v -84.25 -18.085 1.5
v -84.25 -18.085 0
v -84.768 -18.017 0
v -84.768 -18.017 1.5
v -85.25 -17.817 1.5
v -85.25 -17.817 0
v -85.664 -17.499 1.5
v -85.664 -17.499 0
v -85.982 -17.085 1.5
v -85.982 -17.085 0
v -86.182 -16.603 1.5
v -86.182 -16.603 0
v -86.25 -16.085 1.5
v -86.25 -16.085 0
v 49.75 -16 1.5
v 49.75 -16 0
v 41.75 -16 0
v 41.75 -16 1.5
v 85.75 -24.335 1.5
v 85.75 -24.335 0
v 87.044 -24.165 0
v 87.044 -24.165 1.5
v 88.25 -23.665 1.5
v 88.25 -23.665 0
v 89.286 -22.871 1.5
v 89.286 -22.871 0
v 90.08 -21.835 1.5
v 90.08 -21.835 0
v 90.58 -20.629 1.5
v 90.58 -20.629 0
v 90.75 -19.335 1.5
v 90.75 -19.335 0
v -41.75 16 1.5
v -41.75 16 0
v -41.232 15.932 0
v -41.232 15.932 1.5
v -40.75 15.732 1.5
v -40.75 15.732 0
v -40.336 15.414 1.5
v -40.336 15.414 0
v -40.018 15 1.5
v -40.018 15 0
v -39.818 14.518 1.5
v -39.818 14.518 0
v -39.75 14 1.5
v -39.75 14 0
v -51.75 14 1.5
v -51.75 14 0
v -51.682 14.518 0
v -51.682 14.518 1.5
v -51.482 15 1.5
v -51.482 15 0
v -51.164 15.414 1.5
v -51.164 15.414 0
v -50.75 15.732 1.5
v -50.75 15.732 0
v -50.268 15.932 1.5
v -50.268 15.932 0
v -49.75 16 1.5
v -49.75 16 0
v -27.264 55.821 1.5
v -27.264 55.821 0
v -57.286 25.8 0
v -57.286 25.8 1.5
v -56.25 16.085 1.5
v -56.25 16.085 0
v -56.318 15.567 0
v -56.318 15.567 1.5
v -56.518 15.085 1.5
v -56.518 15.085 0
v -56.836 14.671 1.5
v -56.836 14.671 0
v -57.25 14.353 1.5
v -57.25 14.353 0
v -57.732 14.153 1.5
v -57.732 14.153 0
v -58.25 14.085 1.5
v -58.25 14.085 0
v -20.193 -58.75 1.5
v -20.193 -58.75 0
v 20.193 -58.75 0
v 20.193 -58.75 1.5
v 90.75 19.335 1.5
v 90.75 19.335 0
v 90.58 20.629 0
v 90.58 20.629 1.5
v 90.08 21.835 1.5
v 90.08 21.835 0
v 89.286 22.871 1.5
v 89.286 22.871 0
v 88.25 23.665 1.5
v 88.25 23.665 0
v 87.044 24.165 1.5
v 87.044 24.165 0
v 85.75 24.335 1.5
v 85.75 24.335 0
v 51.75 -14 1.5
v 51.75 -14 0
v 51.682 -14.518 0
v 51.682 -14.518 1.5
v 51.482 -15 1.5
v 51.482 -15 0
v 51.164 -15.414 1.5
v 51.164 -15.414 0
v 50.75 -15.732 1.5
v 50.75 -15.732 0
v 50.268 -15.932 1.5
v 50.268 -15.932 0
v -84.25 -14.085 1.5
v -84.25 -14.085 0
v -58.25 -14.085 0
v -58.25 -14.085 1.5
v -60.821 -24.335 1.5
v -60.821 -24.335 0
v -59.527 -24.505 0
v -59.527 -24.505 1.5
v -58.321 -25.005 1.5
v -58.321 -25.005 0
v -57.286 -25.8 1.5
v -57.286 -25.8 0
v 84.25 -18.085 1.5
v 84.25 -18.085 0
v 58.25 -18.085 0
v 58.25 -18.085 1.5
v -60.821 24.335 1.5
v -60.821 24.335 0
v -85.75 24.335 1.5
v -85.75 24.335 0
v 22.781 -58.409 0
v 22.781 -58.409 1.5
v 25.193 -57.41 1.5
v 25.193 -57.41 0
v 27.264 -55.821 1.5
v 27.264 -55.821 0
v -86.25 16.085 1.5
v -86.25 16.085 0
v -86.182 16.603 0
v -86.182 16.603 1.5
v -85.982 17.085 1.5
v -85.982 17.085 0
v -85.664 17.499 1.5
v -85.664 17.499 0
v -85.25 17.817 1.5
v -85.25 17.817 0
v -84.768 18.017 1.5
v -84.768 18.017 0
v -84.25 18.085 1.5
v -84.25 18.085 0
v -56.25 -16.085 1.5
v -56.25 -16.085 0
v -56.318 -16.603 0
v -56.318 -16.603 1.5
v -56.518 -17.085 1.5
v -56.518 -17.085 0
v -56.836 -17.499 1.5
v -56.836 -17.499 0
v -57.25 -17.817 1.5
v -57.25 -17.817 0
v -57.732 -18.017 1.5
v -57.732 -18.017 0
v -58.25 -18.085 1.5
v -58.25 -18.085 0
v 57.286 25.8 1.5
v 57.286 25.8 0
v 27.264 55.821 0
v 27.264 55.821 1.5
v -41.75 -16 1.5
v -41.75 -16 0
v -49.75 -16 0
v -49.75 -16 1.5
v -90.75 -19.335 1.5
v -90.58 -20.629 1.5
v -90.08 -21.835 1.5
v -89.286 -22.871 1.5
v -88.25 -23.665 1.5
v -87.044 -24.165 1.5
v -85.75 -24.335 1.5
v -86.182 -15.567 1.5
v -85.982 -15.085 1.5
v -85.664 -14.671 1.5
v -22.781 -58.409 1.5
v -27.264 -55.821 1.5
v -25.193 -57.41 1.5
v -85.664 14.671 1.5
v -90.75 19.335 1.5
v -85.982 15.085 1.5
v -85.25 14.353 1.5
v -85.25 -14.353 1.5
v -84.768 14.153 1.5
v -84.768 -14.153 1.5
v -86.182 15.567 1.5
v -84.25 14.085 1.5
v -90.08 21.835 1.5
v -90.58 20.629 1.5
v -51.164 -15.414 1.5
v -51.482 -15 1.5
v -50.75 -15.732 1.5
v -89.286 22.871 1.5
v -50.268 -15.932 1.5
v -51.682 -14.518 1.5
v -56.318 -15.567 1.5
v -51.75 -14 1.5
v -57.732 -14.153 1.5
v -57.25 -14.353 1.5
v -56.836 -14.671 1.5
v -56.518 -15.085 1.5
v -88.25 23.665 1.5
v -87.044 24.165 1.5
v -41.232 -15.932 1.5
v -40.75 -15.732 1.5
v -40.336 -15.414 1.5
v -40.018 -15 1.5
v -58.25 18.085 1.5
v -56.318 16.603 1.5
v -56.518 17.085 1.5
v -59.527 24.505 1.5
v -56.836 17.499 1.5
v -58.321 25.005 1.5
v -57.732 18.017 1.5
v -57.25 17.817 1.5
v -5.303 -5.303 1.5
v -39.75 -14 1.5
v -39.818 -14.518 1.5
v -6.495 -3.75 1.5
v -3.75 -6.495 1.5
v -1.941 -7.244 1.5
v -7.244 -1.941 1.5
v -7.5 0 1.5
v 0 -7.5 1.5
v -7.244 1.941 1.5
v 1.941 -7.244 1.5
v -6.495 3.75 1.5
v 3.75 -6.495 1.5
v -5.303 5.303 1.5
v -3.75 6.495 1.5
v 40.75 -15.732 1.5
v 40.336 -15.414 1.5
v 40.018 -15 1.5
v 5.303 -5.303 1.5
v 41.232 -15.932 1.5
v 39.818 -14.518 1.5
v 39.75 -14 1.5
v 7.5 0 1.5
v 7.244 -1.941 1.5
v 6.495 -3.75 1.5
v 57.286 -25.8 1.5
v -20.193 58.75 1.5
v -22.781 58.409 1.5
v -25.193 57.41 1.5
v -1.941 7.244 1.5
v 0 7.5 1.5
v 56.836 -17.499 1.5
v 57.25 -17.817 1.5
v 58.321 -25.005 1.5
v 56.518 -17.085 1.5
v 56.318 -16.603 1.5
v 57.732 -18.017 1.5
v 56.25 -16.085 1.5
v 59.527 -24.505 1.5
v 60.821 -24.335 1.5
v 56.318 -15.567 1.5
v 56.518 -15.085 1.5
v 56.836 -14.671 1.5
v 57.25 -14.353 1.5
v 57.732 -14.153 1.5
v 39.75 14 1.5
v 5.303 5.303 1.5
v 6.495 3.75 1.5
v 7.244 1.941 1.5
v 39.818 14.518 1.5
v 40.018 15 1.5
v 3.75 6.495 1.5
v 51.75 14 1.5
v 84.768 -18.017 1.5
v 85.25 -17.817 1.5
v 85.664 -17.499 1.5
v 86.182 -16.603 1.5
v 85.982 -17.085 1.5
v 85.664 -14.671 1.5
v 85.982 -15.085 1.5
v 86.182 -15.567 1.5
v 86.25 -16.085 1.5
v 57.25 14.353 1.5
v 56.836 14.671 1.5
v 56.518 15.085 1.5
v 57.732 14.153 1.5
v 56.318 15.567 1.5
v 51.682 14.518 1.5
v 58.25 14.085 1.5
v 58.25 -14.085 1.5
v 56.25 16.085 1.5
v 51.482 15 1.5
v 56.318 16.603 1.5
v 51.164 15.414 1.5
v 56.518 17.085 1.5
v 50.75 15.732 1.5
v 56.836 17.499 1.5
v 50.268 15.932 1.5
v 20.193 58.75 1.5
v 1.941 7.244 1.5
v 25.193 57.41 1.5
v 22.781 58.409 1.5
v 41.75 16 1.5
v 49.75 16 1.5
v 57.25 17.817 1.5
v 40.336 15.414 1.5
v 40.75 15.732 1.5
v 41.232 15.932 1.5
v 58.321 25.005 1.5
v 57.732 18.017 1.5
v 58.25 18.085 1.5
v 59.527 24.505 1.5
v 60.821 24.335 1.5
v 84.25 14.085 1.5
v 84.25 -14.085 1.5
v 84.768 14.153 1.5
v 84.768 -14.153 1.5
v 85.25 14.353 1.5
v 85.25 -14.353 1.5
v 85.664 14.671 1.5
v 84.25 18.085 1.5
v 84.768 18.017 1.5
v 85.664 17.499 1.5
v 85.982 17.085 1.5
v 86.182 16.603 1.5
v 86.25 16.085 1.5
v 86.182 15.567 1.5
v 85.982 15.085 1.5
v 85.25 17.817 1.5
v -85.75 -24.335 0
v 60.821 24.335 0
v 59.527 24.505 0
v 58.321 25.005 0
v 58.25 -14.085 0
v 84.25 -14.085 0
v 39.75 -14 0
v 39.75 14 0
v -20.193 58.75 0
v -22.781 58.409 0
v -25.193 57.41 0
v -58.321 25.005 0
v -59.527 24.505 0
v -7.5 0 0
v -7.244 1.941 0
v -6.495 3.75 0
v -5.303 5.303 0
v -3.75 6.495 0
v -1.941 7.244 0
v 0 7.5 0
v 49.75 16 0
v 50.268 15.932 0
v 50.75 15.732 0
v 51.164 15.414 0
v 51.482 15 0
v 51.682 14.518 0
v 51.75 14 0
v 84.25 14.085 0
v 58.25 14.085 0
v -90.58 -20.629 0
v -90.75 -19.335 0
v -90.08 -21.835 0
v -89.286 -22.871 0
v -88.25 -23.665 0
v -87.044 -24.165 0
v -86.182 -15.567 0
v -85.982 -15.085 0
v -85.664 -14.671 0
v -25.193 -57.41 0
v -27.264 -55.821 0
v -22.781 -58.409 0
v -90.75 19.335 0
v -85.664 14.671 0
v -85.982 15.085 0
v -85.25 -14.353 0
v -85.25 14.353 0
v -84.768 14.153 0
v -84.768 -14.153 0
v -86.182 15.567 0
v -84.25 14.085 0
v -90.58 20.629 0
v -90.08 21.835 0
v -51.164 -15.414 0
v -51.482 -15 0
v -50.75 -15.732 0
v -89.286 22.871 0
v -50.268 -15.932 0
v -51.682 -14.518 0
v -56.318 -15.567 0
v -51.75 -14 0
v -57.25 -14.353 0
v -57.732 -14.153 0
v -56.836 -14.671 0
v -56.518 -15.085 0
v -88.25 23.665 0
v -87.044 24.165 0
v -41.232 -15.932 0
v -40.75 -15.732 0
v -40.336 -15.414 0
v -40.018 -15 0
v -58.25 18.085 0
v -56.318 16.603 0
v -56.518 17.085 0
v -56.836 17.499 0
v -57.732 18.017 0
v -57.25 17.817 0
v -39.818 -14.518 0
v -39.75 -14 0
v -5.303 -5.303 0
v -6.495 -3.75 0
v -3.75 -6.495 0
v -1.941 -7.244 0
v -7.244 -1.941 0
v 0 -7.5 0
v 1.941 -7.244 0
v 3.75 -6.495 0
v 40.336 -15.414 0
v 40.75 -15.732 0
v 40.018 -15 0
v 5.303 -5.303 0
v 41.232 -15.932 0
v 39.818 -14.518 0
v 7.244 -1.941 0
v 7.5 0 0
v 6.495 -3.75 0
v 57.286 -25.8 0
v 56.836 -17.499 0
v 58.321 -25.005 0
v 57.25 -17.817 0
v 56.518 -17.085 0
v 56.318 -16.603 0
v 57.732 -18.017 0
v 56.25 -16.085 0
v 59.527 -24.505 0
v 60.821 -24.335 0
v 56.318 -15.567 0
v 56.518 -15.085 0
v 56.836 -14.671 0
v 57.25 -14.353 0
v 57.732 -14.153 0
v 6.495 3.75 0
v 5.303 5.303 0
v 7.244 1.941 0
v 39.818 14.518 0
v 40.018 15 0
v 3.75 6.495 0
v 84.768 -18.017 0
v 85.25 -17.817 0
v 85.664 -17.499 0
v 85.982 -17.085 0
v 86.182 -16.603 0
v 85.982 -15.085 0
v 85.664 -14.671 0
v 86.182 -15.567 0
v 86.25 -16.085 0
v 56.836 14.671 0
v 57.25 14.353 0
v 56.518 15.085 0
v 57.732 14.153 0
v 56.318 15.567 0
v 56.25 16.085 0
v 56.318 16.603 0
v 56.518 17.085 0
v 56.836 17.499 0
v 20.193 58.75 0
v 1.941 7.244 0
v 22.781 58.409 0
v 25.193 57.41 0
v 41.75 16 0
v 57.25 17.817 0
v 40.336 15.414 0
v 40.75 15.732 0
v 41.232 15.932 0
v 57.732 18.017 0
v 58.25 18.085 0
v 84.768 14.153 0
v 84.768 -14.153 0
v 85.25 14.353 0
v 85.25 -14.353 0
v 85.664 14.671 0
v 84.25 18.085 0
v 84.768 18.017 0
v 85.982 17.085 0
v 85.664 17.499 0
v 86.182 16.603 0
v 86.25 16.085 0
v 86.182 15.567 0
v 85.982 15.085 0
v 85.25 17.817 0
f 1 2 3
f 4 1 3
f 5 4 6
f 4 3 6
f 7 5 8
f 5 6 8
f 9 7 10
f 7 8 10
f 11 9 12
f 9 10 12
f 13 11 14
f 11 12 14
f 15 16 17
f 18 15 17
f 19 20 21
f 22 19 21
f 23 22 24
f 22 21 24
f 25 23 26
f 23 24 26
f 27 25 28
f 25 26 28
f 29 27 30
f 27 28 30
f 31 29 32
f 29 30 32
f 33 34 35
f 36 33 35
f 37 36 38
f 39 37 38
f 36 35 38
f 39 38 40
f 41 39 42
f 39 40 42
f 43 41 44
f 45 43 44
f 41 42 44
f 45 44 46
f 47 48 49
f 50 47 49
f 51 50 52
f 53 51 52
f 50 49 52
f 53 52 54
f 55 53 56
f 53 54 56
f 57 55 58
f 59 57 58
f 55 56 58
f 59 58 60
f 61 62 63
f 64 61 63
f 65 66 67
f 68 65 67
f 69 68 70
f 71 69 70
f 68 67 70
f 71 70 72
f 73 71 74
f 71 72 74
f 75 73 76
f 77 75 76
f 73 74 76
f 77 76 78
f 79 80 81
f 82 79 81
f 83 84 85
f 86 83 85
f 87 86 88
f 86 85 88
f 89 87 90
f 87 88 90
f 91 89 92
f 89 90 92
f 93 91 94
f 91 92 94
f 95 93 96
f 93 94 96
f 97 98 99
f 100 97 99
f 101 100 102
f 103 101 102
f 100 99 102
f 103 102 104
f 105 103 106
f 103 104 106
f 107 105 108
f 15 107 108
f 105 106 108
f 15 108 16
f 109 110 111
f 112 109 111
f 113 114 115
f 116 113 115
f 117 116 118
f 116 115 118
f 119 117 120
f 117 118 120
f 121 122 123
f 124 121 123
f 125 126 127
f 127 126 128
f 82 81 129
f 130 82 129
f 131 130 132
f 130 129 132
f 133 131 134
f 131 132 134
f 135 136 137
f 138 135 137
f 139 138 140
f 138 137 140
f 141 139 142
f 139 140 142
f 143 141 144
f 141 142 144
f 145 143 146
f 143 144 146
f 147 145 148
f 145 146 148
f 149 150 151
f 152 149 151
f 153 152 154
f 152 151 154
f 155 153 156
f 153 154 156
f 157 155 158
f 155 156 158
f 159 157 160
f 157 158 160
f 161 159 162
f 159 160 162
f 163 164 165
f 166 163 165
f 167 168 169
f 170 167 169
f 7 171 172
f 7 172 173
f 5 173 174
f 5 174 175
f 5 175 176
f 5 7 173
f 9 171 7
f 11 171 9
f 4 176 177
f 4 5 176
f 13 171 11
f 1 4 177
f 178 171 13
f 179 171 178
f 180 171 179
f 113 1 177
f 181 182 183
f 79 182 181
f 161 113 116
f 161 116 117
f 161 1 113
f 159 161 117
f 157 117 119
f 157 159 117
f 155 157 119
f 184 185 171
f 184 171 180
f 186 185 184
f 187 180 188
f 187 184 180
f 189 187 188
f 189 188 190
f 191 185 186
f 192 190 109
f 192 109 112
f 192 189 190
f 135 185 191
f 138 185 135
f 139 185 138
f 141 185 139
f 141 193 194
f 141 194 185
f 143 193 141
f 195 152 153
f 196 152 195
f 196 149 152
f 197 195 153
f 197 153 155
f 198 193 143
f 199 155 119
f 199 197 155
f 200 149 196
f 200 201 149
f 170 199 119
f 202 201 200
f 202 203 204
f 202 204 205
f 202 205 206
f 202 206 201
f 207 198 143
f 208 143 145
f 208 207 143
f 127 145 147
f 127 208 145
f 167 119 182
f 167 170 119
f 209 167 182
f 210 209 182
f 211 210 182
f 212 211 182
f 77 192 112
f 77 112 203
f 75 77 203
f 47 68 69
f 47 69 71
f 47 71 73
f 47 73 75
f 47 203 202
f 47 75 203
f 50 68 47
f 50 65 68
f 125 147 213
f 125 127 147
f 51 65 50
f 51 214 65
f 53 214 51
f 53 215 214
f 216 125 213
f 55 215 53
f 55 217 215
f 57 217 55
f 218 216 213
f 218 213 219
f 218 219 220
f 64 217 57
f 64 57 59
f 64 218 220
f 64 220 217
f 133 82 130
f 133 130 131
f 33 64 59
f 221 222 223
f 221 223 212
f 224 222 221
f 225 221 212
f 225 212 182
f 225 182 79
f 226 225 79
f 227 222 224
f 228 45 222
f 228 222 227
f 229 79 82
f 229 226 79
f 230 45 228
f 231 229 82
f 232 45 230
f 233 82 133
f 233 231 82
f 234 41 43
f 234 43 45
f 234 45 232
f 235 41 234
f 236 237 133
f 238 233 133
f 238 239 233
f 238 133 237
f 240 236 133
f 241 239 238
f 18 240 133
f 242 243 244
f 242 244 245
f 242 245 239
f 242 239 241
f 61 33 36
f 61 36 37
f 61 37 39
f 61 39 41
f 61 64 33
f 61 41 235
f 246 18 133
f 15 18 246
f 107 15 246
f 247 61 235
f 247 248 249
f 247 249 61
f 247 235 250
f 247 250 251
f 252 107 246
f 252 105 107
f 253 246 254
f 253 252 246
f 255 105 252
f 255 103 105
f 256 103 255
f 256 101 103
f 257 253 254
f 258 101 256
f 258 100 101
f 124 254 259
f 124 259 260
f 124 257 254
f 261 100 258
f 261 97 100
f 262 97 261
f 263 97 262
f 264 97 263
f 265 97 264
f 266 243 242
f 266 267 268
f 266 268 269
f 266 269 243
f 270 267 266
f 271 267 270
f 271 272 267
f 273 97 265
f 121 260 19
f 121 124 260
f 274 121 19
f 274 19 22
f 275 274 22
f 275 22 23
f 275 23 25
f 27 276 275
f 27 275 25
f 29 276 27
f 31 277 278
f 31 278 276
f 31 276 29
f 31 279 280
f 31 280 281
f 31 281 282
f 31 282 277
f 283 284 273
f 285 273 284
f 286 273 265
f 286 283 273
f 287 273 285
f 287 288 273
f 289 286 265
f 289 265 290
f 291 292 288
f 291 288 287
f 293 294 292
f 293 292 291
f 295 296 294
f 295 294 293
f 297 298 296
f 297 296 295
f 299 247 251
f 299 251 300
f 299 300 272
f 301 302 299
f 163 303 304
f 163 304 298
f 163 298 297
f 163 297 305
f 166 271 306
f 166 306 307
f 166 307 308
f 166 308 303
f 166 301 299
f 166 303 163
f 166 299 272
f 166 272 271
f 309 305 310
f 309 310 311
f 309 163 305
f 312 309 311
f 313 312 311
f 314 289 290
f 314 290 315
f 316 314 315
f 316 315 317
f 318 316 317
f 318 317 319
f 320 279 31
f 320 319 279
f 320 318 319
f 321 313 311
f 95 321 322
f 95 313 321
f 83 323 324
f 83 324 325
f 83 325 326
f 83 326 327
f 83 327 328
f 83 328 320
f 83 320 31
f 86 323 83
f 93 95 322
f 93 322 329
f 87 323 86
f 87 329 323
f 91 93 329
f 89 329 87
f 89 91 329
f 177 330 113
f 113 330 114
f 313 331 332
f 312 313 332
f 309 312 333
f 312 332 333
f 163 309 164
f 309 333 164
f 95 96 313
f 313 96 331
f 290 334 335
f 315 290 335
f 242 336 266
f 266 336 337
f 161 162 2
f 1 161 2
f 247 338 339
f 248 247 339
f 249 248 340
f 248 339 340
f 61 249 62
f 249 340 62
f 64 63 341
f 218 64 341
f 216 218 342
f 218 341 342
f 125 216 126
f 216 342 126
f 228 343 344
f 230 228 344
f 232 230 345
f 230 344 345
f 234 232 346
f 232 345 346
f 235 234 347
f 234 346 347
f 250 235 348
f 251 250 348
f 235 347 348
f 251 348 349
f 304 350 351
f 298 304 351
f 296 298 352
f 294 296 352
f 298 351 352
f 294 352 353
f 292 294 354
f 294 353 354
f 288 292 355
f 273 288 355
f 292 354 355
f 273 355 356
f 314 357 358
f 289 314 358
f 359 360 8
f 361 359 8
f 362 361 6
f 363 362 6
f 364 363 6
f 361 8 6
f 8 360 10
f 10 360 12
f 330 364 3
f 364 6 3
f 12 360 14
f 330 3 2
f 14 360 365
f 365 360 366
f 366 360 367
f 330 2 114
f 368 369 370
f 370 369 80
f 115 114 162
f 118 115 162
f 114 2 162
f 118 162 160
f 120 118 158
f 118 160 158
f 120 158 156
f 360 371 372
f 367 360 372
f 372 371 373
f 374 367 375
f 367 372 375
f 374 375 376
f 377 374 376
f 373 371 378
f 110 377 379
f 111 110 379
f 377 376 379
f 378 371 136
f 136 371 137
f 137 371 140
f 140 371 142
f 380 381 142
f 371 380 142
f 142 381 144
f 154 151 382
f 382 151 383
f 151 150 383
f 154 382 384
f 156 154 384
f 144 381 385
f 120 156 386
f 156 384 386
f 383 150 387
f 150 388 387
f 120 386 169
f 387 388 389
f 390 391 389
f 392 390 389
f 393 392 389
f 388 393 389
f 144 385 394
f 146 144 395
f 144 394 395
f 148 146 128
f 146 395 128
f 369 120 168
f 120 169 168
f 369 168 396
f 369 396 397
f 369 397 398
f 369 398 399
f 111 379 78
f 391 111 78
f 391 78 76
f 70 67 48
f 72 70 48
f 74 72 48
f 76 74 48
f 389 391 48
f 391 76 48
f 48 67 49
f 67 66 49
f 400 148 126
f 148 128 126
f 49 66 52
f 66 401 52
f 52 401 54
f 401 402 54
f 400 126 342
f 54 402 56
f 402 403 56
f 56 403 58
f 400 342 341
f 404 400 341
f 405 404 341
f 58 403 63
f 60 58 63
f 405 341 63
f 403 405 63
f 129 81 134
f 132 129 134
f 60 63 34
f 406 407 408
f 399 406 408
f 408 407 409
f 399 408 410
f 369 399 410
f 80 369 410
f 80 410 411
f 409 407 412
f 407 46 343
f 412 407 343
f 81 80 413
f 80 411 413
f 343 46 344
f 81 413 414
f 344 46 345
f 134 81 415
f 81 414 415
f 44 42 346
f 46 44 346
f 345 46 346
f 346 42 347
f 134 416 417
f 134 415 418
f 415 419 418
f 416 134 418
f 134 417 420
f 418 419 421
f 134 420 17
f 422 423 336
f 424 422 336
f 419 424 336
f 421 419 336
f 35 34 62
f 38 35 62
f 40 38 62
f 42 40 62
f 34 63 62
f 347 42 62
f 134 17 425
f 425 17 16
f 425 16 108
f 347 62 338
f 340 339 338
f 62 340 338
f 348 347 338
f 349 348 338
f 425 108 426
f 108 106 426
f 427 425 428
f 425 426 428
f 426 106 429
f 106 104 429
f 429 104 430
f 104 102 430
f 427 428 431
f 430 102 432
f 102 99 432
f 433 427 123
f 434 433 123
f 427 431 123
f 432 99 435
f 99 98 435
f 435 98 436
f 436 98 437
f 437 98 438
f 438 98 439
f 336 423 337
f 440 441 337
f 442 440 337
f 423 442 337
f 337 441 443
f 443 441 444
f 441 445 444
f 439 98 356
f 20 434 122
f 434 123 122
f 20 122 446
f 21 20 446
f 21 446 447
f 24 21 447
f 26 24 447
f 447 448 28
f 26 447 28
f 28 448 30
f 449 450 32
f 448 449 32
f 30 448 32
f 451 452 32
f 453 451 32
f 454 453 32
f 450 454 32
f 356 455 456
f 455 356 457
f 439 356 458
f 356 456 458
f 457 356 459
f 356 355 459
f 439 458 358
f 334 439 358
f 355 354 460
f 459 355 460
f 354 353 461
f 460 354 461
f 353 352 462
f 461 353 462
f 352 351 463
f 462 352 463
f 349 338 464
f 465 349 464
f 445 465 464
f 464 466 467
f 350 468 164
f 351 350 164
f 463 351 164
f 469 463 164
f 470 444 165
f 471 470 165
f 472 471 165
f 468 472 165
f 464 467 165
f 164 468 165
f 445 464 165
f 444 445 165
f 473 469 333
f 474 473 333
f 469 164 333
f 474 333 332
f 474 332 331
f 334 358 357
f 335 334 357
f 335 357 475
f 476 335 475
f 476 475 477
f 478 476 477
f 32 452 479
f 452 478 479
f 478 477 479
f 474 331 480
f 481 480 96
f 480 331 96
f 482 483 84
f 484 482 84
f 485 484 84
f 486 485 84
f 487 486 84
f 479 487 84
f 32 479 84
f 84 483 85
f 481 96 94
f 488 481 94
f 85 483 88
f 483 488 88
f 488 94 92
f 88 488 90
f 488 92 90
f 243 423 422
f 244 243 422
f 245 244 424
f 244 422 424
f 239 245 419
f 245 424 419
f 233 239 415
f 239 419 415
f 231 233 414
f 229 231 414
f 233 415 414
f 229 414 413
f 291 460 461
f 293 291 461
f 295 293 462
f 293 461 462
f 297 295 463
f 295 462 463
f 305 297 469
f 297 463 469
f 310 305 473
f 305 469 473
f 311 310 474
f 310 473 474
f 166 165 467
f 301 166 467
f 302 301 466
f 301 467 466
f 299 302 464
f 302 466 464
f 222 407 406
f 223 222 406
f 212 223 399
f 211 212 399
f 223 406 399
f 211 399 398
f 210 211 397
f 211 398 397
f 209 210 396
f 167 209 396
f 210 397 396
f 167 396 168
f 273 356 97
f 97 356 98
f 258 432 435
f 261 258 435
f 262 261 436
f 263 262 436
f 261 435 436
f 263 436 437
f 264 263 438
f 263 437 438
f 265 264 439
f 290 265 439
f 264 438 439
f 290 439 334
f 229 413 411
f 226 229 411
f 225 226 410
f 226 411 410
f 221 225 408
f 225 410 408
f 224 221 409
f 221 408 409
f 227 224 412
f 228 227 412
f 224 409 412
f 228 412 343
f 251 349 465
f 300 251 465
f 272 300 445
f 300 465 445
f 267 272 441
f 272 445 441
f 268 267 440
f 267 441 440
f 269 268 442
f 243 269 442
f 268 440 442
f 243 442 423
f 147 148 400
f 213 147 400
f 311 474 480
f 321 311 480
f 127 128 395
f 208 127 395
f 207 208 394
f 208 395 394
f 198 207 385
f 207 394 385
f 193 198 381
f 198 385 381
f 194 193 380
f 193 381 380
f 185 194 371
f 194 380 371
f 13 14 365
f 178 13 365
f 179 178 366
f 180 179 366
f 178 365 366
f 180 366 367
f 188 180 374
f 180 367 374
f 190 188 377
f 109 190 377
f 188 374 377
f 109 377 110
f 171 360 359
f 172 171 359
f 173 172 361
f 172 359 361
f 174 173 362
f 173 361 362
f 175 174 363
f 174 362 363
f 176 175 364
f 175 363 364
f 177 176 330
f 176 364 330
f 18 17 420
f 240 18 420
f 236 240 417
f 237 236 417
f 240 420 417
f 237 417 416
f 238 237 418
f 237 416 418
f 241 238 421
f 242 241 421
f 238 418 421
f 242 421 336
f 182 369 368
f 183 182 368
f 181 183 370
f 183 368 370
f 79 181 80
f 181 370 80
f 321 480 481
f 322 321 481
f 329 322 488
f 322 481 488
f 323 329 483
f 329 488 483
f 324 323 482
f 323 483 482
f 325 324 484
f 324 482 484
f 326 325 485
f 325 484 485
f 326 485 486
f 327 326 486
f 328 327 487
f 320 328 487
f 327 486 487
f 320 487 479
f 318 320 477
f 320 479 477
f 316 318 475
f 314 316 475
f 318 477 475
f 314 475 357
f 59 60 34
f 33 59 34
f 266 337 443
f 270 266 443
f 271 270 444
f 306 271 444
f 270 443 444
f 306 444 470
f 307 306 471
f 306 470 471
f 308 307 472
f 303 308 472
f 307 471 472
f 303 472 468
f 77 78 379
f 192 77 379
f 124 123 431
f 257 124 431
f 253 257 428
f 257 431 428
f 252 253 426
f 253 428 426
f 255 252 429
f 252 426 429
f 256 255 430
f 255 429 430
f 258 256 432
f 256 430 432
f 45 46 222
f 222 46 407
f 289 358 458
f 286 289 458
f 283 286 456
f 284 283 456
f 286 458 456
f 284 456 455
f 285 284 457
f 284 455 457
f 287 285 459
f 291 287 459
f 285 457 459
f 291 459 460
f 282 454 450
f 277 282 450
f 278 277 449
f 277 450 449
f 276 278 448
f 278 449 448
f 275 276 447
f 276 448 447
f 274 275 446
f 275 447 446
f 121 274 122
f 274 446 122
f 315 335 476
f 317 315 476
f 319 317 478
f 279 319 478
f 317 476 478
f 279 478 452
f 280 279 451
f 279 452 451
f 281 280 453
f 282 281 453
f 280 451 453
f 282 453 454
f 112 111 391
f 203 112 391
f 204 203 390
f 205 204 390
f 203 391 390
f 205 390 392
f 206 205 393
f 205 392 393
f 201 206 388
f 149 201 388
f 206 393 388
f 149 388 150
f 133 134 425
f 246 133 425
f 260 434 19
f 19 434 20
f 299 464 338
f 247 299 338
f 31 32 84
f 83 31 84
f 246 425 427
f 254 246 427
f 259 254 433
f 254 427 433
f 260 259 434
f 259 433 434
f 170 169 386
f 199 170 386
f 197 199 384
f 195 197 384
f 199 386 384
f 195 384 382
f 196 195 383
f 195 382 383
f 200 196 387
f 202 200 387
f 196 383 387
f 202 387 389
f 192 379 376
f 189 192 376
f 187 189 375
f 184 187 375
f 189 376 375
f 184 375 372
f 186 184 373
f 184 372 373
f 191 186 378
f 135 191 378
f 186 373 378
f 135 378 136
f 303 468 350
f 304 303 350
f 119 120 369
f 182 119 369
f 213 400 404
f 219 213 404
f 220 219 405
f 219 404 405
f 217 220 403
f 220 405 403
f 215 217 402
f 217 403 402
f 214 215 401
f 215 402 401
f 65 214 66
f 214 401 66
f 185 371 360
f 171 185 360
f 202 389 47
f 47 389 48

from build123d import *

# Parameters (mm, degrees)
F1_DEPTH = 1.5


with BuildPart() as f1:
    # F0 (on Top) → F1 (new body)
    with BuildSketch(Plane.XY):
        with BuildLine():
            Line((-58.75, -14.085047), (-58.75, 0))
            Line((-58.75, 0), (-90.75, 0))
            Line((-90.75, 0), (-90.75, -14.085047))
            Line((-90.75, -14.085047), (-90.75, -19.335047))
            ThreePointArc((-90.75, -19.335047), (-89.285534, -22.870581), (-85.75, -24.335047))
            Line((-85.75, -24.335047), (-80.50245, -24.335047))
            Line((-80.50245, -24.335047), (-80.50245, -18.085047))
            Line((-80.50245, -18.085047), (-84.25, -18.085047))
            ThreePointArc((-84.25, -18.085047), (-85.664214, -17.49926), (-86.25, -16.085047))
            ThreePointArc((-86.25, -16.085047), (-85.664214, -14.670833), (-84.25, -14.085047))
            Line((-84.25, -14.085047), (-58.75, -14.085047))
        make_face()
        with BuildLine():
            Line((90.75, 0), (58.75, 0))
            Line((58.75, 0), (51.75, 0))
            Line((51.75, 0), (51.75, -14))
            ThreePointArc((51.75, -14), (51.164214, -15.414214), (49.75, -16))
            Line((49.75, -16), (41.75, -16))
            ThreePointArc((41.75, -16), (40.335786, -15.414214), (39.75, -14))
            Line((39.75, -14), (39.75, 0))
            Line((39.75, 0), (7.5, 0))
            ThreePointArc((7.5, 0), (5.303301, -5.303301), (0, -7.5))
            Line((0, -7.5), (0, -58.75))
            Line((0, -58.75), (20.192911, -58.75))
            ThreePointArc((20.192911, -58.75), (24.019745, -57.988795), (27.263979, -55.821068))
            Line((27.263979, -55.821068), (57.285534, -25.799513))
            ThreePointArc((57.285534, -25.799513), (58.907651, -24.715649), (60.821068, -24.335047))
            Line((60.821068, -24.335047), (85.75, -24.335047))
            ThreePointArc((85.75, -24.335047), (89.285534, -22.870581), (90.75, -19.335047))
            Line((90.75, -19.335047), (90.75, 0))
        make_face()
        with BuildLine():
            Line((58.25, -14.085047), (58.75, -14.085047))
            Line((58.75, -14.085047), (84.25, -14.085047))
            ThreePointArc((84.25, -14.085047), (85.664214, -14.670833), (86.25, -16.085047))
            ThreePointArc((86.25, -16.085047), (85.664214, -17.49926), (84.25, -18.085047))
            Line((84.25, -18.085047), (58.75, -18.085047))
            Line((58.75, -18.085047), (58.25, -18.085047))
            ThreePointArc((58.25, -18.085047), (56.835786, -17.49926), (56.25, -16.085047))
            ThreePointArc((56.25, -16.085047), (56.835786, -14.670833), (58.25, -14.085047))
        make_face(mode=Mode.SUBTRACT)
        with BuildLine():
            Line((51.75, 0), (58.75, 0))
            Line((58.75, 0), (90.75, 0))
            Line((90.75, 0), (90.75, 19.335047))
            ThreePointArc((90.75, 19.335047), (89.285534, 22.870581), (85.75, 24.335047))
            Line((85.75, 24.335047), (60.821068, 24.335047))
            ThreePointArc((60.821068, 24.335047), (58.907651, 24.715649), (57.285534, 25.799513))
            Line((57.285534, 25.799513), (27.263979, 55.821068))
            ThreePointArc((27.263979, 55.821068), (24.019745, 57.988795), (20.192911, 58.75))
            Line((20.192911, 58.75), (0, 58.75))
            Line((0, 58.75), (0, 7.5))
            ThreePointArc((0, 7.5), (5.303301, 5.303301), (7.5, 0))
            Line((7.5, 0), (39.75, 0))
            Line((39.75, 0), (39.75, 14))
            ThreePointArc((39.75, 14), (40.335786, 15.414214), (41.75, 16))
            Line((41.75, 16), (49.75, 16))
            ThreePointArc((49.75, 16), (51.164214, 15.414214), (51.75, 14))
            Line((51.75, 14), (51.75, 0))
        make_face()
        with BuildLine():
            Line((58.25, 18.085047), (58.75, 18.085047))
            Line((58.75, 18.085047), (84.25, 18.085047))
            ThreePointArc((84.25, 18.085047), (85.664214, 17.49926), (86.25, 16.085047))
            ThreePointArc((86.25, 16.085047), (85.664214, 14.670833), (84.25, 14.085047))
            Line((84.25, 14.085047), (58.75, 14.085047))
            Line((58.75, 14.085047), (58.25, 14.085047))
            ThreePointArc((58.25, 14.085047), (56.835786, 14.670833), (56.25, 16.085047))
            ThreePointArc((56.25, 16.085047), (56.835786, 17.49926), (58.25, 18.085047))
        make_face(mode=Mode.SUBTRACT)
        with BuildLine():
            Line((0, -58.75), (0, -7.5))
            ThreePointArc((0, -7.5), (-5.303301, -5.303301), (-7.5, 0))
            Line((-7.5, 0), (-39.75, 0))
            Line((-39.75, 0), (-39.75, -14))
            ThreePointArc((-39.75, -14), (-40.335786, -15.414214), (-41.75, -16))
            Line((-41.75, -16), (-49.75, -16))
            ThreePointArc((-49.75, -16), (-51.164214, -15.414214), (-51.75, -14))
            Line((-51.75, -14), (-51.75, 0))
            Line((-51.75, 0), (-58.75, 0))
            Line((-58.75, 0), (-58.75, -14.085047))
            Line((-58.75, -14.085047), (-58.25, -14.085047))
            ThreePointArc((-58.25, -14.085047), (-56.835786, -14.670833), (-56.25, -16.085047))
            ThreePointArc((-56.25, -16.085047), (-56.835786, -17.49926), (-58.25, -18.085047))
            Line((-58.25, -18.085047), (-58.75, -18.085047))
            Line((-58.75, -18.085047), (-80.50245, -18.085047))
            Line((-80.50245, -18.085047), (-80.50245, -24.335047))
            Line((-80.50245, -24.335047), (-60.821068, -24.335047))
            ThreePointArc((-60.821068, -24.335047), (-58.907651, -24.715649), (-57.285534, -25.799513))
            Line((-57.285534, -25.799513), (-27.263979, -55.821068))
            ThreePointArc((-27.263979, -55.821068), (-24.019745, -57.988795), (-20.192911, -58.75))
            Line((-20.192911, -58.75), (0, -58.75))
        make_face()
        with BuildLine():
            ThreePointArc((-7.5, 0), (-5.303301, 5.303301), (0, 7.5))
            Line((0, 7.5), (0, 58.75))
            Line((0, 58.75), (-20.192911, 58.75))
            ThreePointArc((-20.192911, 58.75), (-24.019745, 57.988795), (-27.263979, 55.821068))
            Line((-27.263979, 55.821068), (-57.285534, 25.799513))
            ThreePointArc((-57.285534, 25.799513), (-58.907651, 24.715649), (-60.821068, 24.335047))
            Line((-60.821068, 24.335047), (-85.75, 24.335047))
            ThreePointArc((-85.75, 24.335047), (-89.285534, 22.870581), (-90.75, 19.335047))
            Line((-90.75, 19.335047), (-90.75, 0))
            Line((-90.75, 0), (-58.75, 0))
            Line((-58.75, 0), (-51.75, 0))
            Line((-51.75, 0), (-51.75, 14))
            ThreePointArc((-51.75, 14), (-51.164214, 15.414214), (-49.75, 16))
            Line((-49.75, 16), (-41.75, 16))
            ThreePointArc((-41.75, 16), (-40.335786, 15.414214), (-39.75, 14))
            Line((-39.75, 14), (-39.75, 0))
            Line((-39.75, 0), (-7.5, 0))
        make_face()
        with BuildLine():
            Line((-58.25, 14.085047), (-58.75, 14.085047))
            Line((-58.75, 14.085047), (-84.25, 14.085047))
            ThreePointArc((-84.25, 14.085047), (-85.664214, 14.670833), (-86.25, 16.085047))
            ThreePointArc((-86.25, 16.085047), (-85.664214, 17.49926), (-84.25, 18.085047))
            Line((-84.25, 18.085047), (-58.75, 18.085047))
            Line((-58.75, 18.085047), (-58.25, 18.085047))
            ThreePointArc((-58.25, 18.085047), (-56.835786, 17.49926), (-56.25, 16.085047))
            ThreePointArc((-56.25, 16.085047), (-56.835786, 14.670833), (-58.25, 14.085047))
        make_face(mode=Mode.SUBTRACT)
    extrude(amount=F1_DEPTH)


solid = f1.part
